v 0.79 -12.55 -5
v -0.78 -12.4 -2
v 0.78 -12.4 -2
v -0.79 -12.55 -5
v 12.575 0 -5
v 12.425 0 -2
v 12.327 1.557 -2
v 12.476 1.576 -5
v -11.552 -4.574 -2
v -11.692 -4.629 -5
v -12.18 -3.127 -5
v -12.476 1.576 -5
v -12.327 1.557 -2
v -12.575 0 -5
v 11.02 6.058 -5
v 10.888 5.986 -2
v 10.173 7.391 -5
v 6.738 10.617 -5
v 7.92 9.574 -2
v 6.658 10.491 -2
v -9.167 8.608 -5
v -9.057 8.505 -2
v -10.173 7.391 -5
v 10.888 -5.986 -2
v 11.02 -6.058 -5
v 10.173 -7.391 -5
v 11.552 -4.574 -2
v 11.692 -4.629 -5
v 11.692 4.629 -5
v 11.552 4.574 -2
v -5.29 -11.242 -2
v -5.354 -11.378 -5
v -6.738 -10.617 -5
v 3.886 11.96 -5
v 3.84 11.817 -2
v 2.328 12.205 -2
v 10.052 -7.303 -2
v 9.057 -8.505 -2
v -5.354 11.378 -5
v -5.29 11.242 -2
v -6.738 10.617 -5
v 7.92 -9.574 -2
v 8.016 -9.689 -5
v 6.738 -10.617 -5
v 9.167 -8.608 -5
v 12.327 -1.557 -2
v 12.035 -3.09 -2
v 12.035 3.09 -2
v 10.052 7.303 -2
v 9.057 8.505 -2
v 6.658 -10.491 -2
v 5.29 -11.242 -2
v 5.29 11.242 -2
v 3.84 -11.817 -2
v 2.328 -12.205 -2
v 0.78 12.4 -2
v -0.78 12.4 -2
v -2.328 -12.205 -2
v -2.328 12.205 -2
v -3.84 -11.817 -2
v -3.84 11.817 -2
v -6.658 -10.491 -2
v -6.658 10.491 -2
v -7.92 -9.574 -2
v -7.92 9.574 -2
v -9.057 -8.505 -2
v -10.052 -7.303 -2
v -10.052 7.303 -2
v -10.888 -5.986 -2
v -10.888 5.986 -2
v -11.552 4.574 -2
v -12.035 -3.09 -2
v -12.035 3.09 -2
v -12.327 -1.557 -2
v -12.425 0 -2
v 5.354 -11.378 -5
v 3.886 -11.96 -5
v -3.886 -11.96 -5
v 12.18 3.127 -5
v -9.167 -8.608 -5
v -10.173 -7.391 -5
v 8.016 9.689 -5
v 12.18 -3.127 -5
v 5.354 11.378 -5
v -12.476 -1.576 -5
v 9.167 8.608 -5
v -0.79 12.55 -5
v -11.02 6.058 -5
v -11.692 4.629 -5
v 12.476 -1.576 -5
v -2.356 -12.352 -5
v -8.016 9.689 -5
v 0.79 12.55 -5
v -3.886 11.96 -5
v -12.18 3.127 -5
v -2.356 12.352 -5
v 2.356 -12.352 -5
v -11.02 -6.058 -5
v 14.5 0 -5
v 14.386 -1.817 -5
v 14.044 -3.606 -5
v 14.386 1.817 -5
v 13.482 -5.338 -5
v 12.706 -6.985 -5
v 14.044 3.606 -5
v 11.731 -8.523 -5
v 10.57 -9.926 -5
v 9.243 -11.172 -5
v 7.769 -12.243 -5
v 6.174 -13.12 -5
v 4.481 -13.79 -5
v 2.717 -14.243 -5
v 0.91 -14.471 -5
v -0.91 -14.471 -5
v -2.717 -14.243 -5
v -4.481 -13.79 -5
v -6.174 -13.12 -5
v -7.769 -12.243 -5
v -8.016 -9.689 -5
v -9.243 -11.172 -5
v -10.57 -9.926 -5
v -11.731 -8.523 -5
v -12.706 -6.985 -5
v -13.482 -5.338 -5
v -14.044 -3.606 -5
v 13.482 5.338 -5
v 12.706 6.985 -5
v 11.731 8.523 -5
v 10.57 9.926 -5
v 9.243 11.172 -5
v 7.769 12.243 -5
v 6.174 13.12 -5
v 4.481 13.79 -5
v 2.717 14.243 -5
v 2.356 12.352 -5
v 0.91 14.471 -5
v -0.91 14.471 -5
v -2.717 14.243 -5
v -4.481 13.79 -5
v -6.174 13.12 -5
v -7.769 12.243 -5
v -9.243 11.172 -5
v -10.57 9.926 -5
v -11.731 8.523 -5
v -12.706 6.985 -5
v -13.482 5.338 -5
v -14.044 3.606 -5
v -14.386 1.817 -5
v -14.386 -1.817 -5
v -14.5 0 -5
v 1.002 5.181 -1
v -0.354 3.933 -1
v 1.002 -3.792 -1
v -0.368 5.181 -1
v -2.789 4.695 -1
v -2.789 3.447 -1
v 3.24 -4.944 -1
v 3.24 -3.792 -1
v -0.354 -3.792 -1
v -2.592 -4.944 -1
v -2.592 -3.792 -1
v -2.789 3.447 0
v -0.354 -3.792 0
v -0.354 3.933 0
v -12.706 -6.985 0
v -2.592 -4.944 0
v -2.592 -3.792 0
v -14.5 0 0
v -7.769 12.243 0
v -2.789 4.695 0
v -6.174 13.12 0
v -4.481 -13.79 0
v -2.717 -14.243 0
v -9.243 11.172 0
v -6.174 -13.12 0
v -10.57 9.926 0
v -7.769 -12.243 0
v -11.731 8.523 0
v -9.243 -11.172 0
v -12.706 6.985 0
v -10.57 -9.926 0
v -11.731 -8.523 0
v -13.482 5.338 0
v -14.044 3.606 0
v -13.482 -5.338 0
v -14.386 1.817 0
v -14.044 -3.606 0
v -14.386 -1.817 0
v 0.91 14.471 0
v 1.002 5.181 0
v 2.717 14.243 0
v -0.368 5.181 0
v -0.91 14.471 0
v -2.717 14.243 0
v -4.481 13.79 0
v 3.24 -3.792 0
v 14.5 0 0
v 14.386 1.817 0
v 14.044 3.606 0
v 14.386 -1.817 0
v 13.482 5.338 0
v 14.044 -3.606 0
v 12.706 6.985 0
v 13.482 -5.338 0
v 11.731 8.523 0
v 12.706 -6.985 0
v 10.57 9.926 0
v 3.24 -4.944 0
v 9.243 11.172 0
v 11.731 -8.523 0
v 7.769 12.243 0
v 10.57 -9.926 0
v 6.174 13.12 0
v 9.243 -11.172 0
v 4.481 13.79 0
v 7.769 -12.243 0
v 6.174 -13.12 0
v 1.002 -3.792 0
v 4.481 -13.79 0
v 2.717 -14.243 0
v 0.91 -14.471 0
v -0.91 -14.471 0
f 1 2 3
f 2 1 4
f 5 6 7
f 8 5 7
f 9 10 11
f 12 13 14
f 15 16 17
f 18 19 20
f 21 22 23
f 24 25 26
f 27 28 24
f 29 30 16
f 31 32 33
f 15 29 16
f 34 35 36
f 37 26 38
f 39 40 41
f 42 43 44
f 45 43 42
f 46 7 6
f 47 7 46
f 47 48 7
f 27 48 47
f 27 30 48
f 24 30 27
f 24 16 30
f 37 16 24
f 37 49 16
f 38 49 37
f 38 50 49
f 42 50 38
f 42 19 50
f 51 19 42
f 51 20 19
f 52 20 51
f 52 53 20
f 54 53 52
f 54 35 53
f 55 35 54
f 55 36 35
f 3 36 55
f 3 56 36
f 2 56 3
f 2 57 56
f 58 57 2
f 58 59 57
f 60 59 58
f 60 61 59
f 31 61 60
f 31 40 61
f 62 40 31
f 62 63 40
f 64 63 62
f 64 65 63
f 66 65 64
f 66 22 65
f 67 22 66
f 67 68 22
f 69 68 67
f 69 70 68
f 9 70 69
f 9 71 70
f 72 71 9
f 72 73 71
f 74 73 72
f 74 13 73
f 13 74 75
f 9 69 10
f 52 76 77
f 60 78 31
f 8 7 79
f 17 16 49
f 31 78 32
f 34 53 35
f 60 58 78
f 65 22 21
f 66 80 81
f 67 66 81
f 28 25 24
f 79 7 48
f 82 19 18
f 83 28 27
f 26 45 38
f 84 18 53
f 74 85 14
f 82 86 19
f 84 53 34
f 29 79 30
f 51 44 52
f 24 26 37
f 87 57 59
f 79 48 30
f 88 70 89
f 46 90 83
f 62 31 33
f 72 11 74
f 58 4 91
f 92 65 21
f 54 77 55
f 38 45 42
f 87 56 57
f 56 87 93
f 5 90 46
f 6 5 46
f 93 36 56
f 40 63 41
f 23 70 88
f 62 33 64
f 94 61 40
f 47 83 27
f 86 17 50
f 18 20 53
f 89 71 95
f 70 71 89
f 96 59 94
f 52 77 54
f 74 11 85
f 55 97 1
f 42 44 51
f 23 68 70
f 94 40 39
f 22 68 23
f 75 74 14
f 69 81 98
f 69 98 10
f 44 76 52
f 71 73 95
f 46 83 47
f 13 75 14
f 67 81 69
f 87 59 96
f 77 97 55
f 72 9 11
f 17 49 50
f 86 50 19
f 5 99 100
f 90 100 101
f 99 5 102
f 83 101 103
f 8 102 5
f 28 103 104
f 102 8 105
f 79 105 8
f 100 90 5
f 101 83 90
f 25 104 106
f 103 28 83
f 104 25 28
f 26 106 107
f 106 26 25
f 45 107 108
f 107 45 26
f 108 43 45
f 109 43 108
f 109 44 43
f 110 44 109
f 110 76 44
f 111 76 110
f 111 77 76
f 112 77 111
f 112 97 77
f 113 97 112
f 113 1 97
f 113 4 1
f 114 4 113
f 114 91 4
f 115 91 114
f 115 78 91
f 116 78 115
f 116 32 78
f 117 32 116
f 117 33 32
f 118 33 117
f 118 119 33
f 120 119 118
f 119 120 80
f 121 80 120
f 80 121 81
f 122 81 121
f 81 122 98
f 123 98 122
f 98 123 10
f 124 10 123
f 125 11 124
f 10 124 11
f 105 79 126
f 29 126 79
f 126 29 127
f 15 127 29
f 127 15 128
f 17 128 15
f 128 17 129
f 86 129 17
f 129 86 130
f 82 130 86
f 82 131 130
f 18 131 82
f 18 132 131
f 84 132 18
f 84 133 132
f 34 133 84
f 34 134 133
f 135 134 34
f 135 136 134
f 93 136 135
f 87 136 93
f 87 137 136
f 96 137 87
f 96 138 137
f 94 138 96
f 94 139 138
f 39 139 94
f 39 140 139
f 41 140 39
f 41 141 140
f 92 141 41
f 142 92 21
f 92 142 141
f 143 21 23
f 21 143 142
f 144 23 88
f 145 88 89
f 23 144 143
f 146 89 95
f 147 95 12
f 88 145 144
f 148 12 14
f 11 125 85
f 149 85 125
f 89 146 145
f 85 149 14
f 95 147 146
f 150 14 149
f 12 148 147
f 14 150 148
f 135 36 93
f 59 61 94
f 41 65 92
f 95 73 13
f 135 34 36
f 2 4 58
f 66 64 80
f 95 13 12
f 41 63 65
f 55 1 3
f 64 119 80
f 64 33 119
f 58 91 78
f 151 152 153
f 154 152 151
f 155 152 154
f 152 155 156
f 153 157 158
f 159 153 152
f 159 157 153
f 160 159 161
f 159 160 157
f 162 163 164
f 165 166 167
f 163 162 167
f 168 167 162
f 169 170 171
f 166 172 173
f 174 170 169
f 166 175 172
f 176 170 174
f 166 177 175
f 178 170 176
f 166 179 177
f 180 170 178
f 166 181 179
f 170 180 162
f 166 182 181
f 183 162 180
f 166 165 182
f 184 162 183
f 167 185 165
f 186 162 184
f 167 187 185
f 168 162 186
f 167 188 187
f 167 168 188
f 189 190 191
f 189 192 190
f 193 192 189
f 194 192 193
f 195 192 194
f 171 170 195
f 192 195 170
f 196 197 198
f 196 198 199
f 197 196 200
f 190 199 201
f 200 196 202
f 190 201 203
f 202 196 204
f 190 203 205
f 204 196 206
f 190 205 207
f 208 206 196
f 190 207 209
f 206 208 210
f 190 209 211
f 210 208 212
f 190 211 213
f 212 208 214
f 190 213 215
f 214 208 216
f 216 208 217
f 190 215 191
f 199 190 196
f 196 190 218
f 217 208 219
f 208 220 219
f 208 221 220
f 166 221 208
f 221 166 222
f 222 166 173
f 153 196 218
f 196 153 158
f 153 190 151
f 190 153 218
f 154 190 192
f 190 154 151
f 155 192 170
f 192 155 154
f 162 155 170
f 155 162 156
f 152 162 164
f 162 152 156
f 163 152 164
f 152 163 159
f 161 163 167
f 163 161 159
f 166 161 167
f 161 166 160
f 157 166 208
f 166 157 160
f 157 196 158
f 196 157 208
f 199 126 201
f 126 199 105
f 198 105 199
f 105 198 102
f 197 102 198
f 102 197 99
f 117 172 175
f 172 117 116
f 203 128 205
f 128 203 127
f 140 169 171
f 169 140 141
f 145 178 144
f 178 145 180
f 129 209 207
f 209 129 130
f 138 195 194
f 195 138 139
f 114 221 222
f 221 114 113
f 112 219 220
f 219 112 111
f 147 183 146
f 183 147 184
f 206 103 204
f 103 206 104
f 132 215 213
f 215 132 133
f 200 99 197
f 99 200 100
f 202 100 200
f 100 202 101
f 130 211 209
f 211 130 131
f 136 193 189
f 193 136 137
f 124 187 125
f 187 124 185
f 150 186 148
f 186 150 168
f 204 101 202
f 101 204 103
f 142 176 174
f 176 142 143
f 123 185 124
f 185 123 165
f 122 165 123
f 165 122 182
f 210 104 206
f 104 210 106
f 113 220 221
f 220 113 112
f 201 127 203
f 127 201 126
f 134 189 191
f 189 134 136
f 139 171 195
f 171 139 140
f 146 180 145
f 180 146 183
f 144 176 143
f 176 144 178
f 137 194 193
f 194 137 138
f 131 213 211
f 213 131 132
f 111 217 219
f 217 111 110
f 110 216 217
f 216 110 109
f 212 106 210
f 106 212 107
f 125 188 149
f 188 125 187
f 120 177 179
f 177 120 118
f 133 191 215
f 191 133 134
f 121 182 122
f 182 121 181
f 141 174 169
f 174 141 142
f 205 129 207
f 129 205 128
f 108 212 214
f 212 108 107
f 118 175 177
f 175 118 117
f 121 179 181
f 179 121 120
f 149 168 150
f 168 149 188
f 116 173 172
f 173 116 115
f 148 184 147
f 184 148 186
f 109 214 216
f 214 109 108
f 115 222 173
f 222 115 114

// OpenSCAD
$fn = 50;

difference() {
	union() {
		translate(v = [0, 0, -5.0]) {
			cylinder(h = 5, r = 14.5);
		}
	}
	union() {
		#translate(v = [0, 0, -5.0]) {
			cylinder(h = 3, r1 = 12.575, r2 = 12.425);
		}
		translate(v = [0, 0, -1]) {
			linear_extrude(height = 1) {
				text(font = "Impact", halign = "center", size = 10, text = "1", valign = "center");
			}
		}
	}
}
